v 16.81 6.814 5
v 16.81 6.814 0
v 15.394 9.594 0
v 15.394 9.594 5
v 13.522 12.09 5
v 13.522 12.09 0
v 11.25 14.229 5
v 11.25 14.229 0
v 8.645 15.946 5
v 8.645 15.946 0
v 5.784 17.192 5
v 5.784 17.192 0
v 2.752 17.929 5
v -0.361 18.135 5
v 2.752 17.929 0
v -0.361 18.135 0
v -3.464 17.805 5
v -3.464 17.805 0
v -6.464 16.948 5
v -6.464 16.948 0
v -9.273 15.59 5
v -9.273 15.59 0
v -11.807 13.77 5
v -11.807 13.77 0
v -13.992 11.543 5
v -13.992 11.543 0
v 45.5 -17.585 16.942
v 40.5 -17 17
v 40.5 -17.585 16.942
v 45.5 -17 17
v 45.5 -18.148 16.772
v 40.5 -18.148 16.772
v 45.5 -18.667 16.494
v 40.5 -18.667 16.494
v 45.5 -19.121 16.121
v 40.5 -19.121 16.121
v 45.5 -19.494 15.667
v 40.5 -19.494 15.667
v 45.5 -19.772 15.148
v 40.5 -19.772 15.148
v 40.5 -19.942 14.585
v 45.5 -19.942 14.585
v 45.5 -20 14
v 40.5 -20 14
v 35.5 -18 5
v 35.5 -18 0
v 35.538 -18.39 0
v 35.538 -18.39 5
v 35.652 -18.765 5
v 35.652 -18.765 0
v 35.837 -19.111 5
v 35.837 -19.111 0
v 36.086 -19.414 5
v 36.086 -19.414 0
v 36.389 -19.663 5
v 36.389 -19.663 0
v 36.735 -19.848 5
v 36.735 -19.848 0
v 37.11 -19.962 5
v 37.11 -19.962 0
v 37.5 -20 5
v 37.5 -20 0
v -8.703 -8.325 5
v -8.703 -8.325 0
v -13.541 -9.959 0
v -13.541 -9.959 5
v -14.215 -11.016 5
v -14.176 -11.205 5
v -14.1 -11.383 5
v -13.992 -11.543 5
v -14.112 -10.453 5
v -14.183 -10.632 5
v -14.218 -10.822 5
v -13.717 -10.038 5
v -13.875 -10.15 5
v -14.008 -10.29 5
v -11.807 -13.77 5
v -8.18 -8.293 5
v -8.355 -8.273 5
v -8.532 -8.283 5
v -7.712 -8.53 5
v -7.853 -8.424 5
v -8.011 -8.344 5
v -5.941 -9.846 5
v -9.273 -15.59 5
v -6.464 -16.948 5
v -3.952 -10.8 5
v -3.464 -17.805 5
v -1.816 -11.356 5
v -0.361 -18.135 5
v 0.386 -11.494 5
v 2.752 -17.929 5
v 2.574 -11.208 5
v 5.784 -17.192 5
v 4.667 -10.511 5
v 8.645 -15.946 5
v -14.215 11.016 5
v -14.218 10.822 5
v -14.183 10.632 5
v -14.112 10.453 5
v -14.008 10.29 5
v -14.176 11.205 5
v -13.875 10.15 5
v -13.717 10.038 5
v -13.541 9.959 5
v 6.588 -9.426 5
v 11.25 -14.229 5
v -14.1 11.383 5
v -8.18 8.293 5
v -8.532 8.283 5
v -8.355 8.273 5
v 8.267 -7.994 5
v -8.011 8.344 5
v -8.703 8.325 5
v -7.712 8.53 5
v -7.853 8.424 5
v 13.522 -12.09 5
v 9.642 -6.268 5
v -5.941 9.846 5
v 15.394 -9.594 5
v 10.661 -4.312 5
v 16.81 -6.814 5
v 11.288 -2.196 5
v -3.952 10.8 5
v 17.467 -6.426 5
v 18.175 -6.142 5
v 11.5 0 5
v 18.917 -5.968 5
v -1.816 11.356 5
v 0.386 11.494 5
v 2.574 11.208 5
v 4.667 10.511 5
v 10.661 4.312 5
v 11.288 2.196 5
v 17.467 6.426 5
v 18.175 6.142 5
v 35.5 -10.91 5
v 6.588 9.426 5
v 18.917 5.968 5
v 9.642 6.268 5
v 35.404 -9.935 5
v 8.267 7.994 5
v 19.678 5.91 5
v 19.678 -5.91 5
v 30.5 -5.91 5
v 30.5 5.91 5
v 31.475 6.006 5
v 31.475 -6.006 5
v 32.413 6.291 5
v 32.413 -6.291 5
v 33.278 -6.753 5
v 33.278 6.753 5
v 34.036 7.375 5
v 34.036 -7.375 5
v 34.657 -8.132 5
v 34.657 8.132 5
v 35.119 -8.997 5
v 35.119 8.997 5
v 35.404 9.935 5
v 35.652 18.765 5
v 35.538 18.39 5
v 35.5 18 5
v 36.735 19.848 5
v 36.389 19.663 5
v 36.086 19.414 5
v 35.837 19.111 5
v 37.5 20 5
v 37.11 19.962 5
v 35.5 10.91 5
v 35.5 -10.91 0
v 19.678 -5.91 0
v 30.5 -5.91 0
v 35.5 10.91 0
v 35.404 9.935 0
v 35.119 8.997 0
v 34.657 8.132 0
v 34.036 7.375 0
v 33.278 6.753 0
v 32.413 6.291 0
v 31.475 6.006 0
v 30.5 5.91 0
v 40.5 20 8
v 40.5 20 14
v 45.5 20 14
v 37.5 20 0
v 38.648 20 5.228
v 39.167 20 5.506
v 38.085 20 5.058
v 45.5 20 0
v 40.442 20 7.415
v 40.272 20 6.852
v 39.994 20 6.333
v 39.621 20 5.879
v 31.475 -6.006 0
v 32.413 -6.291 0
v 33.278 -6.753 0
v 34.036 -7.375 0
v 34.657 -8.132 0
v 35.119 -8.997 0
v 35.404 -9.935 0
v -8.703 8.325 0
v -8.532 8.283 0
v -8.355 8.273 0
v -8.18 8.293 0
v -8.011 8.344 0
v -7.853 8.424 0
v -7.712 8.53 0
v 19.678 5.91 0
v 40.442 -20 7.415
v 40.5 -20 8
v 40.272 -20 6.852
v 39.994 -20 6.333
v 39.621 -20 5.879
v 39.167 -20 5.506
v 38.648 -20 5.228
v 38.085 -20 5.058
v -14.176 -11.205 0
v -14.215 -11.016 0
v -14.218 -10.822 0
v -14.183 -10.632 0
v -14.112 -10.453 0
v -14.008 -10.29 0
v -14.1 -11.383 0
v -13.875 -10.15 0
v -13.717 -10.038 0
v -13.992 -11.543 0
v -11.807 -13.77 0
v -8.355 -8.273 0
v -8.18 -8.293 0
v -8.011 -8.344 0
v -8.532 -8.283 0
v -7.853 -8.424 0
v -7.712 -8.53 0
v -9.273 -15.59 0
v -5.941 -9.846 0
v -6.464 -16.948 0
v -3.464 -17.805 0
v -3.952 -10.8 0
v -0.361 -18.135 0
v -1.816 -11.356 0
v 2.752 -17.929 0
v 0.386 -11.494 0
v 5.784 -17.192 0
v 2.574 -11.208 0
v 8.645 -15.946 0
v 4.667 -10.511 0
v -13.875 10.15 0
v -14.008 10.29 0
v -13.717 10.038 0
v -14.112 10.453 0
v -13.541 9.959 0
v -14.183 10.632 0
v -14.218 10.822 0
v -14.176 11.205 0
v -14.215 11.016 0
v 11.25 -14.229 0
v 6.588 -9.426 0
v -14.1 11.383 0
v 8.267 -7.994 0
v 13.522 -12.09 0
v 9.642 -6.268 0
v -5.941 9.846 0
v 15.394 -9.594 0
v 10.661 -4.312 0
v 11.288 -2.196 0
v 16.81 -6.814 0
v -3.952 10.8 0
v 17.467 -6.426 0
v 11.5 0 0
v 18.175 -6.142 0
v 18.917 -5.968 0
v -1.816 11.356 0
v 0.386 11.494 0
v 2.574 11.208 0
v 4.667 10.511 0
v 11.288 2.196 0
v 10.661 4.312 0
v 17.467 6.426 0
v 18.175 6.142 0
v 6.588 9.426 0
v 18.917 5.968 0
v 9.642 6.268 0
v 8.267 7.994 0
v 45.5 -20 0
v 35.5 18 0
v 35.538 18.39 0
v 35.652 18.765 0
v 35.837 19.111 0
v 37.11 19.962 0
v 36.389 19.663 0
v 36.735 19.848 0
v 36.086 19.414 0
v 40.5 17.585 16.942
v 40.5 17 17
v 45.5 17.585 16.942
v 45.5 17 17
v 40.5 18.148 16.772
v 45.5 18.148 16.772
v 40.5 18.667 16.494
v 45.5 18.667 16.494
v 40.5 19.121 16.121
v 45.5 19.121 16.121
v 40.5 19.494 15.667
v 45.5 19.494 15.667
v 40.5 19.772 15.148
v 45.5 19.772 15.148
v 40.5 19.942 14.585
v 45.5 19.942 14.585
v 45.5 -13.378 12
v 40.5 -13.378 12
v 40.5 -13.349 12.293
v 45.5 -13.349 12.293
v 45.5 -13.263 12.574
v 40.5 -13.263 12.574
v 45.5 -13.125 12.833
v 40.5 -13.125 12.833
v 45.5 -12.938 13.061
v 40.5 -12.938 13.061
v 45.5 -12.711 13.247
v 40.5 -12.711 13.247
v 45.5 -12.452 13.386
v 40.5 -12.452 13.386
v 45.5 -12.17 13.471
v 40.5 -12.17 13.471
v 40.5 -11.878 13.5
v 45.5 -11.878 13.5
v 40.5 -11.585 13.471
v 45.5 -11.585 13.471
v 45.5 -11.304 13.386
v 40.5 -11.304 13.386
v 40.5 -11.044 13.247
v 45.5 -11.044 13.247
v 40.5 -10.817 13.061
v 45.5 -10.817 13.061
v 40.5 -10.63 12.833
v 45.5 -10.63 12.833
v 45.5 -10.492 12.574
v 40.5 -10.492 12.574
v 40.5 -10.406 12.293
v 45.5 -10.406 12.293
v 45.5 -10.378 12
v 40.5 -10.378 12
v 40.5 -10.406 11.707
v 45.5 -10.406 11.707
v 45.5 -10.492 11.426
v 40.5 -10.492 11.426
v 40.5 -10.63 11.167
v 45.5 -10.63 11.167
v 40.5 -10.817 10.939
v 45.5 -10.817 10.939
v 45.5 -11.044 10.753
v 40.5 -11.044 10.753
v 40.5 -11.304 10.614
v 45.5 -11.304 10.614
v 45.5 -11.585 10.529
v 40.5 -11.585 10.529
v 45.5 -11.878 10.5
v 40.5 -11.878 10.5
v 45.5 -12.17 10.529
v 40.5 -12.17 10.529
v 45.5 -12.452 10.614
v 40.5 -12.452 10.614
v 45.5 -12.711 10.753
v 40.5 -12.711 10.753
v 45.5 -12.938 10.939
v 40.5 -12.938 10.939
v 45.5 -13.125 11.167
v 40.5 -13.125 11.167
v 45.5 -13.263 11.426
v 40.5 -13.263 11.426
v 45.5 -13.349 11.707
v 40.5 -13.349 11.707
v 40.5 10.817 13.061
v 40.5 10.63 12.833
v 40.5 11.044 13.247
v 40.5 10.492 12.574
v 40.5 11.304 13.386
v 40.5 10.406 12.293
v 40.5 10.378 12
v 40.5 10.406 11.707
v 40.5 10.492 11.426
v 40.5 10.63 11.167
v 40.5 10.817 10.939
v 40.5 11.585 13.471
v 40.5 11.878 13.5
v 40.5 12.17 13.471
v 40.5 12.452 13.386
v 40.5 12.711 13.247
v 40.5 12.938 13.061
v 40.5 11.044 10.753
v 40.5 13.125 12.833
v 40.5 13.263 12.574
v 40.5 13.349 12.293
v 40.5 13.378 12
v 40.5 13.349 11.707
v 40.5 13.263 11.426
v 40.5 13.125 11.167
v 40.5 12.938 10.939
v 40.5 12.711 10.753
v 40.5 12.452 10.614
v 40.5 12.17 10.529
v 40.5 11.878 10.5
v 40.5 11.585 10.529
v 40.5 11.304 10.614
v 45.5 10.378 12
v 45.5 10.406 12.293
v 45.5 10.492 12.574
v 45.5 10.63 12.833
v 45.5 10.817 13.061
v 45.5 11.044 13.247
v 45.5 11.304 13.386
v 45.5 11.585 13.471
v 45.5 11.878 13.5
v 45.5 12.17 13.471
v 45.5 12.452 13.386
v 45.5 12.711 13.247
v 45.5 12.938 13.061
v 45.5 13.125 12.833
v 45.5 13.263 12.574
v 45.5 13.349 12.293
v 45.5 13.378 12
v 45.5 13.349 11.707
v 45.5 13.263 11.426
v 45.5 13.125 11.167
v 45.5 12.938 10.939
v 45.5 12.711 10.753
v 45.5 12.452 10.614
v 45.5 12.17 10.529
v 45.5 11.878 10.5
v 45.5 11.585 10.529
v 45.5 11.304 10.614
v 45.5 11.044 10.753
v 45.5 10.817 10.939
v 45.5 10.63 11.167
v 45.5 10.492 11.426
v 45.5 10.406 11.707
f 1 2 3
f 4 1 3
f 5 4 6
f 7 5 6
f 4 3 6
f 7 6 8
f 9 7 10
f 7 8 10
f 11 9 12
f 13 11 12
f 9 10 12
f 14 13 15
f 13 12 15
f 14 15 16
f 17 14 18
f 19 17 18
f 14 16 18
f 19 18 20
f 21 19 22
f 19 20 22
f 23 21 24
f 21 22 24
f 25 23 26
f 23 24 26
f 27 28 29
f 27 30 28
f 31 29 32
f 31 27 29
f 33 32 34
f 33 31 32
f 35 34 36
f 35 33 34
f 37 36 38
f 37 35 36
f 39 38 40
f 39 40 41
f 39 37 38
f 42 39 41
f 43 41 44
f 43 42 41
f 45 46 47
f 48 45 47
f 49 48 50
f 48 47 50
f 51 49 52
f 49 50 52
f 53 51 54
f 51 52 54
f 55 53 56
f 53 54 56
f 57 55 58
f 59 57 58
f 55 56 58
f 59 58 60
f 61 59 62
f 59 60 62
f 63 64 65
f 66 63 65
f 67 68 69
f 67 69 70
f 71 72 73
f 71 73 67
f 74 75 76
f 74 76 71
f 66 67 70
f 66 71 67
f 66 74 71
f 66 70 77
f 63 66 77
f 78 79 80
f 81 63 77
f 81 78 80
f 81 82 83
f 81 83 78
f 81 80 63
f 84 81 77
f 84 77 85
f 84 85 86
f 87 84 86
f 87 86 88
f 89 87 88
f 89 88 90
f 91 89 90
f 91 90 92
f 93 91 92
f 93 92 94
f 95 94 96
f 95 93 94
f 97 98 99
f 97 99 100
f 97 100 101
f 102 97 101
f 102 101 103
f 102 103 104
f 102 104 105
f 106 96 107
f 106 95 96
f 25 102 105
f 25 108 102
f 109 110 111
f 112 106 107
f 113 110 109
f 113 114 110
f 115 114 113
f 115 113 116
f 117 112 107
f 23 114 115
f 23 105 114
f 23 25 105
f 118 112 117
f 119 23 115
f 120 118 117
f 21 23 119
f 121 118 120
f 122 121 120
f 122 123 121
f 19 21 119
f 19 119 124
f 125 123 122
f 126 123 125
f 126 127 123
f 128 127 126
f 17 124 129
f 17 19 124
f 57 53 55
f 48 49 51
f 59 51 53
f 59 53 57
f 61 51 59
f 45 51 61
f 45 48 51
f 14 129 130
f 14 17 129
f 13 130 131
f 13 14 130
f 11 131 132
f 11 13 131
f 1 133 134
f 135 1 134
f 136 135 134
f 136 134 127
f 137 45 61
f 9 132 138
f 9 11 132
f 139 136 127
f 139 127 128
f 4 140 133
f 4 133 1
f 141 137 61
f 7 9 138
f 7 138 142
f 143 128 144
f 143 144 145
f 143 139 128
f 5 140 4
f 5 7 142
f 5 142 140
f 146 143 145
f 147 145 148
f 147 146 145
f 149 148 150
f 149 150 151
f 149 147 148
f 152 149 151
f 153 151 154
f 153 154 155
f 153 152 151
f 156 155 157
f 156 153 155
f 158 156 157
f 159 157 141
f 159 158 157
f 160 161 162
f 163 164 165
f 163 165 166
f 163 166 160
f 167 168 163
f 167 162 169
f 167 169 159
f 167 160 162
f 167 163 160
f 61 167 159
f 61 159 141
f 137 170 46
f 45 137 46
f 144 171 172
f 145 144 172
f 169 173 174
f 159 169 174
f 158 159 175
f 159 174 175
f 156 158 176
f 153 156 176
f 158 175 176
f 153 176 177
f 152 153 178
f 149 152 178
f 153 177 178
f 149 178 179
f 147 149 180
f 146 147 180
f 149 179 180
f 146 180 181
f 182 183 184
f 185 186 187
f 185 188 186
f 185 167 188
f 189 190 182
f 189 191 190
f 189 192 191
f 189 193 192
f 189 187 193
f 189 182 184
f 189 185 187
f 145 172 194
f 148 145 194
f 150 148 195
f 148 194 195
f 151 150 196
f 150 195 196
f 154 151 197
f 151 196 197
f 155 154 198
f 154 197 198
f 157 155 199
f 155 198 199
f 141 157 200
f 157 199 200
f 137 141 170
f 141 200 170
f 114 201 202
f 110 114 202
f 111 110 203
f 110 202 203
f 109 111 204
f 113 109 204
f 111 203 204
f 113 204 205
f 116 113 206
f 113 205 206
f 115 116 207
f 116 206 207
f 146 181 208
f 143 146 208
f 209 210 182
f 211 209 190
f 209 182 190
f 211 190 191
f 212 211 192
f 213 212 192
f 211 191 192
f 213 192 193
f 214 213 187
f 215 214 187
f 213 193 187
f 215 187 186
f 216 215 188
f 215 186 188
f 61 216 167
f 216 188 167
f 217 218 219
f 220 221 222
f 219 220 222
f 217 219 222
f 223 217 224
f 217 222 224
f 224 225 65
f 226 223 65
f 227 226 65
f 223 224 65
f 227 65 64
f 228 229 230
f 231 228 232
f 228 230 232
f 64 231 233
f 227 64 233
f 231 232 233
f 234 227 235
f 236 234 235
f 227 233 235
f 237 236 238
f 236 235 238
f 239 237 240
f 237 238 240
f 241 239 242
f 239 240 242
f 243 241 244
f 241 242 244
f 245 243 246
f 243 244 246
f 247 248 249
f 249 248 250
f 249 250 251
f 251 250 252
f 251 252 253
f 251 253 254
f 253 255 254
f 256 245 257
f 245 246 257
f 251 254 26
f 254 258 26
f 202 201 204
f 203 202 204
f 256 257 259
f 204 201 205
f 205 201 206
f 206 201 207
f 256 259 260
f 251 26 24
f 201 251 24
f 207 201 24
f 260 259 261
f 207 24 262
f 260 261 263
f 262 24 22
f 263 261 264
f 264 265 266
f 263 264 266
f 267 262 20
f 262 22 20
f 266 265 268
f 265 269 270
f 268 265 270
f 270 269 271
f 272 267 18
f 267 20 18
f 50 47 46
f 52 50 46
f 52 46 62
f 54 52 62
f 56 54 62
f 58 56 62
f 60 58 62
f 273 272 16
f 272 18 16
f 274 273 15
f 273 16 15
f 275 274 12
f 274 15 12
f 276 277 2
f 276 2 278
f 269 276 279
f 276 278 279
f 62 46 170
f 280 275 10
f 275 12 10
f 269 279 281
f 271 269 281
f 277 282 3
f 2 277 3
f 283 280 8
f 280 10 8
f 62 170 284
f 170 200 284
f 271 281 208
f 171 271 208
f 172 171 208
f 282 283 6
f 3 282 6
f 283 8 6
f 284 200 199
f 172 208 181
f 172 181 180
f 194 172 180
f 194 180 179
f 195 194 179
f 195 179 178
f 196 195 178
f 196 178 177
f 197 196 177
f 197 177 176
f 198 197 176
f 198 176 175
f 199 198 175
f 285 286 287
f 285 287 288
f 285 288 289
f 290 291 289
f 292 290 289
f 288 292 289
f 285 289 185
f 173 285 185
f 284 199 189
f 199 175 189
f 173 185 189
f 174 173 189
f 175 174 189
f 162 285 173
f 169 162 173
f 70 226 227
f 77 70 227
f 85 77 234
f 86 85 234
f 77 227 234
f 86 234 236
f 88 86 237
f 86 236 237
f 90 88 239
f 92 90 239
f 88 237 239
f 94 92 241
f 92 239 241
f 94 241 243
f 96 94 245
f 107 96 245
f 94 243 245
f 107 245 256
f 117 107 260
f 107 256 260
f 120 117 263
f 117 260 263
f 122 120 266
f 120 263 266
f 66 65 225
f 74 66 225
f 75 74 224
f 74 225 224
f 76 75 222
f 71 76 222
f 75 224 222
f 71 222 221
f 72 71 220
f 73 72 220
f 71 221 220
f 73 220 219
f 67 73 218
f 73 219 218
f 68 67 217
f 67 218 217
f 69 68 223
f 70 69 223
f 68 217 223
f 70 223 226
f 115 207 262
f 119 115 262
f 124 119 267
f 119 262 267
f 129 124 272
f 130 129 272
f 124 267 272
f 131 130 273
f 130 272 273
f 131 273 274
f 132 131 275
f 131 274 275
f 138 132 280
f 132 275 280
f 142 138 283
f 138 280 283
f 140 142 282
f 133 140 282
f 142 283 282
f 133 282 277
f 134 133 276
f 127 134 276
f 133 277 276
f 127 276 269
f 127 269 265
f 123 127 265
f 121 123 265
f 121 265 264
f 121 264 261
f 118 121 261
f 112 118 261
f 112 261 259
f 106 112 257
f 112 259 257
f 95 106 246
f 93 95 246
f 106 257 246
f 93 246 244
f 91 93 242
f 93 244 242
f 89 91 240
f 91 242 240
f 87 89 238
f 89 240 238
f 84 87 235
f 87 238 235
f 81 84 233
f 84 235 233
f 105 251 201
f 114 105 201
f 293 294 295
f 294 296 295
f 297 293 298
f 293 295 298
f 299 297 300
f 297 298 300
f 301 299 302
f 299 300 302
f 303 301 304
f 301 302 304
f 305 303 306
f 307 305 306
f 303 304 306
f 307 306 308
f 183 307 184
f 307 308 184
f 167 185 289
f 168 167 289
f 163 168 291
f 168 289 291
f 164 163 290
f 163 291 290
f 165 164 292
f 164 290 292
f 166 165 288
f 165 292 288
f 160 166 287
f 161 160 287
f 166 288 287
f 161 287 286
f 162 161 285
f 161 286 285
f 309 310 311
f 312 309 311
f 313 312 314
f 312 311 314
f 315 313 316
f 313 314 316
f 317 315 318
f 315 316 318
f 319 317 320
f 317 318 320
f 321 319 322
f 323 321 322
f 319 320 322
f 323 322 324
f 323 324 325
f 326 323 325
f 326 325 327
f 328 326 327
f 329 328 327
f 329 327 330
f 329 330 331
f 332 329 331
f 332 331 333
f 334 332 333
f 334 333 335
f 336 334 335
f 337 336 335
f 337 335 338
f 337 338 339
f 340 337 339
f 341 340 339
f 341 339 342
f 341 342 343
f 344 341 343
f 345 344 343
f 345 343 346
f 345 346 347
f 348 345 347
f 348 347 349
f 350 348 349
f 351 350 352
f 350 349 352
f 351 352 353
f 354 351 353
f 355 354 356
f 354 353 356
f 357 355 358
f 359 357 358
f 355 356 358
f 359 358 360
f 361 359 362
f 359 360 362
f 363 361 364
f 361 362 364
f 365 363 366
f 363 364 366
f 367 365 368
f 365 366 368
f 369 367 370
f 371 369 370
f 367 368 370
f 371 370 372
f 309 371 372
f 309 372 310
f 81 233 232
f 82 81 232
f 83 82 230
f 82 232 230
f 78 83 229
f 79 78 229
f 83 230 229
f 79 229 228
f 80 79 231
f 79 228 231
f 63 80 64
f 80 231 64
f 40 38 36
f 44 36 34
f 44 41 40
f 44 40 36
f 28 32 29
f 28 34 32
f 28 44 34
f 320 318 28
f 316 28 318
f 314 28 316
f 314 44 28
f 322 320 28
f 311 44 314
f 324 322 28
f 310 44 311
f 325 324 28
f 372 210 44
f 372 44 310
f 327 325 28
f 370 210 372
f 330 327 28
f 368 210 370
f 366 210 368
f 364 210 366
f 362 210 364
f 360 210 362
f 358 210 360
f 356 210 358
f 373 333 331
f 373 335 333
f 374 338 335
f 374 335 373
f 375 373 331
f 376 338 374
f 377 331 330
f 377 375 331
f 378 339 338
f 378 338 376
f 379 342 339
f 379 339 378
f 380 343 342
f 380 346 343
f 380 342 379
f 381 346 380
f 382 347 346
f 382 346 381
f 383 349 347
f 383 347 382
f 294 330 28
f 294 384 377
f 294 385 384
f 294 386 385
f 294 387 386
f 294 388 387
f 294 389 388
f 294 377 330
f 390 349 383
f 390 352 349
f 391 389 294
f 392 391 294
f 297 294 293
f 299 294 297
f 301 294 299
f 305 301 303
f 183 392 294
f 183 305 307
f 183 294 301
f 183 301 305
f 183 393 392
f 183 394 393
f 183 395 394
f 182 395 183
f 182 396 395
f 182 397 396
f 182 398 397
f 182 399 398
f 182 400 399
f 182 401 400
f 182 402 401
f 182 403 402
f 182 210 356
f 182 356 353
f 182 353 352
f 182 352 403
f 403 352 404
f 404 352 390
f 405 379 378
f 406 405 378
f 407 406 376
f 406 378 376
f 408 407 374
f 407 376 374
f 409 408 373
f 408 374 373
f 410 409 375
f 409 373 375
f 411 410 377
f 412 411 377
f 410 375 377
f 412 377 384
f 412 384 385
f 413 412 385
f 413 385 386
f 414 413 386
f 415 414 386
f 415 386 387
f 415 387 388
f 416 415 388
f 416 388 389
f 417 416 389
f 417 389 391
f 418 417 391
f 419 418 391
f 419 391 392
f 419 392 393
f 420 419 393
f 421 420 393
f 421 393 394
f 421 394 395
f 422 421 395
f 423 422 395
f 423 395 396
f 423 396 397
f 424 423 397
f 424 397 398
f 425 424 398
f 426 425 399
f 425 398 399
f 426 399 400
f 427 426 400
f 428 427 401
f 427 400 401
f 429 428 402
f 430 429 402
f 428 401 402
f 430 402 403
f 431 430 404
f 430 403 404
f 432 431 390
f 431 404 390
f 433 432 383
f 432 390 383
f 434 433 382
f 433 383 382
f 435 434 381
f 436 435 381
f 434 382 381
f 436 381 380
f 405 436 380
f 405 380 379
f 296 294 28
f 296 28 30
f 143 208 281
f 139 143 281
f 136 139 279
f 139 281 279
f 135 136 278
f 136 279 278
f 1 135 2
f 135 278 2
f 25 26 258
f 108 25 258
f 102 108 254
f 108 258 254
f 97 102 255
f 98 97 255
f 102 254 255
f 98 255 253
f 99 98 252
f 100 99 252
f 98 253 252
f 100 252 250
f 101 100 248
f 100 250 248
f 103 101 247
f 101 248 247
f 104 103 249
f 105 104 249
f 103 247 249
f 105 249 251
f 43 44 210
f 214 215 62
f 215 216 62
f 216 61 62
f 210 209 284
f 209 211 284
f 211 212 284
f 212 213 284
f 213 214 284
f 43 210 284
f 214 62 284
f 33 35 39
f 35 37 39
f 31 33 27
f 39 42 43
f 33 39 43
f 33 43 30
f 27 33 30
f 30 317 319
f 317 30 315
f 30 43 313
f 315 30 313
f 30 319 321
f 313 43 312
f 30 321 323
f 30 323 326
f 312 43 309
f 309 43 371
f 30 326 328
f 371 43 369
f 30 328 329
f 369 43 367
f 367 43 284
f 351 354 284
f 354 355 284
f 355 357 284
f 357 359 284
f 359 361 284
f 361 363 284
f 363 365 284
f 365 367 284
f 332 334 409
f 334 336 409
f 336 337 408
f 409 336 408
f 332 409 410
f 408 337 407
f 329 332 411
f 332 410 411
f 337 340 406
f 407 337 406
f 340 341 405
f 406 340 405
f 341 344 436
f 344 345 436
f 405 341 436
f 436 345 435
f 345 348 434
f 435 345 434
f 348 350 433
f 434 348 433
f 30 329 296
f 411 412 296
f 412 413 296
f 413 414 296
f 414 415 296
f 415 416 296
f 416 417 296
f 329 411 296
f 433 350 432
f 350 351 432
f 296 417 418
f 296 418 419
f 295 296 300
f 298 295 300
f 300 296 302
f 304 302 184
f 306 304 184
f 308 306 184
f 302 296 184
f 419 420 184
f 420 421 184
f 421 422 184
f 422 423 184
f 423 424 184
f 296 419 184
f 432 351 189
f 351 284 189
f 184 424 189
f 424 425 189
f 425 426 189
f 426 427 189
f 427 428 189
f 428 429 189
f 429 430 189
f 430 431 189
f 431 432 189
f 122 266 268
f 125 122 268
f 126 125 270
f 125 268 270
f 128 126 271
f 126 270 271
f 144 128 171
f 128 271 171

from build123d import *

# Parameters (mm, degrees)
F1_DEPTH = 5
F2_W     = 5
F2_H     = 40
F3_DEPTH = 12
F4_R     = 3
F5_R     = 1.5
F6_DEPTH = 10


with BuildPart() as f1:
    # F0 (on Top) → F1 (new body)
    with BuildSketch(Plane.XY):
        with BuildLine():
            ThreePointArc((-7.71248, 8.530396), (11.5, 0), (-7.71248, -8.530396))
            ThreePointArc((-7.71248, -8.530396), (-8.179899, -8.293039), (-8.703171, -8.324766))
            Line((-8.703171, -8.324766), (-13.541093, -9.959054))
            ThreePointArc((-13.541093, -9.959054), (-14.18276, -10.632379), (-13.992452, -11.54281))
            ThreePointArc((-13.992452, -11.54281), (2.75234, -17.929021), (16.810487, -6.814154))
            ThreePointArc((16.810487, -6.814154), (18.174589, -6.14164), (19.677769, -5.910335))
            Line((19.677769, -5.910335), (30.5, -5.910335))
            ThreePointArc((30.5, -5.910335), (34.035534, -7.374801), (35.5, -10.910335))
            Line((35.5, -10.910335), (35.5, -18))
            ThreePointArc((35.5, -18), (36.085786, -19.414214), (37.5, -20))
            Line((37.5, -20), (45.5, -20))
            Line((45.5, -20), (45.5, 0))
            Line((45.5, 0), (45.5, 20))
            Line((45.5, 20), (37.5, 20))
            ThreePointArc((37.5, 20), (36.085786, 19.414214), (35.5, 18))
            Line((35.5, 18), (35.5, 10.910335))
            ThreePointArc((35.5, 10.910335), (34.035534, 7.374801), (30.5, 5.910335))
            Line((30.5, 5.910335), (19.677769, 5.910335))
            ThreePointArc((19.677769, 5.910335), (18.174589, 6.14164), (16.810487, 6.814154))
            ThreePointArc((16.810487, 6.814154), (2.75234, 17.929021), (-13.992452, 11.54281))
            ThreePointArc((-13.992452, 11.54281), (-14.18276, 10.632379), (-13.541093, 9.959054))
            Line((-13.541093, 9.959054), (-8.703171, 8.324766))
            ThreePointArc((-8.703171, 8.324766), (-8.179899, 8.293039), (-7.71248, 8.530396))
        make_face()
    extrude(amount=F1_DEPTH)

    # F2 (on face) → F3 (join)
    with BuildSketch(Plane.XY.offset(5)):
        with Locations((43, 0)):
            Rectangle(F2_W, F2_H)
    extrude(amount=F3_DEPTH)

    # F4
    f4_edges = [f1.edges().sort_by_distance(p)[0] for p in [
        (40.5, 0, 5),
        (43, 20, 17),
        (43, -20, 17),
    ]]
    fillet(f4_edges, radius=F4_R)

    # F5 (on face) → F6 (cut)
    with BuildSketch(Plane(origin=(40.5, 0, 0), x_dir=(0, -1, 0), z_dir=(-1, 0, 0))):
        with Locations((-11.877556, 12)):
            Circle(F5_R)
        with Locations((11.877556, 12)):
            Circle(F5_R)
    extrude(amount=-F6_DEPTH, mode=Mode.SUBTRACT)


solid = f1.part
